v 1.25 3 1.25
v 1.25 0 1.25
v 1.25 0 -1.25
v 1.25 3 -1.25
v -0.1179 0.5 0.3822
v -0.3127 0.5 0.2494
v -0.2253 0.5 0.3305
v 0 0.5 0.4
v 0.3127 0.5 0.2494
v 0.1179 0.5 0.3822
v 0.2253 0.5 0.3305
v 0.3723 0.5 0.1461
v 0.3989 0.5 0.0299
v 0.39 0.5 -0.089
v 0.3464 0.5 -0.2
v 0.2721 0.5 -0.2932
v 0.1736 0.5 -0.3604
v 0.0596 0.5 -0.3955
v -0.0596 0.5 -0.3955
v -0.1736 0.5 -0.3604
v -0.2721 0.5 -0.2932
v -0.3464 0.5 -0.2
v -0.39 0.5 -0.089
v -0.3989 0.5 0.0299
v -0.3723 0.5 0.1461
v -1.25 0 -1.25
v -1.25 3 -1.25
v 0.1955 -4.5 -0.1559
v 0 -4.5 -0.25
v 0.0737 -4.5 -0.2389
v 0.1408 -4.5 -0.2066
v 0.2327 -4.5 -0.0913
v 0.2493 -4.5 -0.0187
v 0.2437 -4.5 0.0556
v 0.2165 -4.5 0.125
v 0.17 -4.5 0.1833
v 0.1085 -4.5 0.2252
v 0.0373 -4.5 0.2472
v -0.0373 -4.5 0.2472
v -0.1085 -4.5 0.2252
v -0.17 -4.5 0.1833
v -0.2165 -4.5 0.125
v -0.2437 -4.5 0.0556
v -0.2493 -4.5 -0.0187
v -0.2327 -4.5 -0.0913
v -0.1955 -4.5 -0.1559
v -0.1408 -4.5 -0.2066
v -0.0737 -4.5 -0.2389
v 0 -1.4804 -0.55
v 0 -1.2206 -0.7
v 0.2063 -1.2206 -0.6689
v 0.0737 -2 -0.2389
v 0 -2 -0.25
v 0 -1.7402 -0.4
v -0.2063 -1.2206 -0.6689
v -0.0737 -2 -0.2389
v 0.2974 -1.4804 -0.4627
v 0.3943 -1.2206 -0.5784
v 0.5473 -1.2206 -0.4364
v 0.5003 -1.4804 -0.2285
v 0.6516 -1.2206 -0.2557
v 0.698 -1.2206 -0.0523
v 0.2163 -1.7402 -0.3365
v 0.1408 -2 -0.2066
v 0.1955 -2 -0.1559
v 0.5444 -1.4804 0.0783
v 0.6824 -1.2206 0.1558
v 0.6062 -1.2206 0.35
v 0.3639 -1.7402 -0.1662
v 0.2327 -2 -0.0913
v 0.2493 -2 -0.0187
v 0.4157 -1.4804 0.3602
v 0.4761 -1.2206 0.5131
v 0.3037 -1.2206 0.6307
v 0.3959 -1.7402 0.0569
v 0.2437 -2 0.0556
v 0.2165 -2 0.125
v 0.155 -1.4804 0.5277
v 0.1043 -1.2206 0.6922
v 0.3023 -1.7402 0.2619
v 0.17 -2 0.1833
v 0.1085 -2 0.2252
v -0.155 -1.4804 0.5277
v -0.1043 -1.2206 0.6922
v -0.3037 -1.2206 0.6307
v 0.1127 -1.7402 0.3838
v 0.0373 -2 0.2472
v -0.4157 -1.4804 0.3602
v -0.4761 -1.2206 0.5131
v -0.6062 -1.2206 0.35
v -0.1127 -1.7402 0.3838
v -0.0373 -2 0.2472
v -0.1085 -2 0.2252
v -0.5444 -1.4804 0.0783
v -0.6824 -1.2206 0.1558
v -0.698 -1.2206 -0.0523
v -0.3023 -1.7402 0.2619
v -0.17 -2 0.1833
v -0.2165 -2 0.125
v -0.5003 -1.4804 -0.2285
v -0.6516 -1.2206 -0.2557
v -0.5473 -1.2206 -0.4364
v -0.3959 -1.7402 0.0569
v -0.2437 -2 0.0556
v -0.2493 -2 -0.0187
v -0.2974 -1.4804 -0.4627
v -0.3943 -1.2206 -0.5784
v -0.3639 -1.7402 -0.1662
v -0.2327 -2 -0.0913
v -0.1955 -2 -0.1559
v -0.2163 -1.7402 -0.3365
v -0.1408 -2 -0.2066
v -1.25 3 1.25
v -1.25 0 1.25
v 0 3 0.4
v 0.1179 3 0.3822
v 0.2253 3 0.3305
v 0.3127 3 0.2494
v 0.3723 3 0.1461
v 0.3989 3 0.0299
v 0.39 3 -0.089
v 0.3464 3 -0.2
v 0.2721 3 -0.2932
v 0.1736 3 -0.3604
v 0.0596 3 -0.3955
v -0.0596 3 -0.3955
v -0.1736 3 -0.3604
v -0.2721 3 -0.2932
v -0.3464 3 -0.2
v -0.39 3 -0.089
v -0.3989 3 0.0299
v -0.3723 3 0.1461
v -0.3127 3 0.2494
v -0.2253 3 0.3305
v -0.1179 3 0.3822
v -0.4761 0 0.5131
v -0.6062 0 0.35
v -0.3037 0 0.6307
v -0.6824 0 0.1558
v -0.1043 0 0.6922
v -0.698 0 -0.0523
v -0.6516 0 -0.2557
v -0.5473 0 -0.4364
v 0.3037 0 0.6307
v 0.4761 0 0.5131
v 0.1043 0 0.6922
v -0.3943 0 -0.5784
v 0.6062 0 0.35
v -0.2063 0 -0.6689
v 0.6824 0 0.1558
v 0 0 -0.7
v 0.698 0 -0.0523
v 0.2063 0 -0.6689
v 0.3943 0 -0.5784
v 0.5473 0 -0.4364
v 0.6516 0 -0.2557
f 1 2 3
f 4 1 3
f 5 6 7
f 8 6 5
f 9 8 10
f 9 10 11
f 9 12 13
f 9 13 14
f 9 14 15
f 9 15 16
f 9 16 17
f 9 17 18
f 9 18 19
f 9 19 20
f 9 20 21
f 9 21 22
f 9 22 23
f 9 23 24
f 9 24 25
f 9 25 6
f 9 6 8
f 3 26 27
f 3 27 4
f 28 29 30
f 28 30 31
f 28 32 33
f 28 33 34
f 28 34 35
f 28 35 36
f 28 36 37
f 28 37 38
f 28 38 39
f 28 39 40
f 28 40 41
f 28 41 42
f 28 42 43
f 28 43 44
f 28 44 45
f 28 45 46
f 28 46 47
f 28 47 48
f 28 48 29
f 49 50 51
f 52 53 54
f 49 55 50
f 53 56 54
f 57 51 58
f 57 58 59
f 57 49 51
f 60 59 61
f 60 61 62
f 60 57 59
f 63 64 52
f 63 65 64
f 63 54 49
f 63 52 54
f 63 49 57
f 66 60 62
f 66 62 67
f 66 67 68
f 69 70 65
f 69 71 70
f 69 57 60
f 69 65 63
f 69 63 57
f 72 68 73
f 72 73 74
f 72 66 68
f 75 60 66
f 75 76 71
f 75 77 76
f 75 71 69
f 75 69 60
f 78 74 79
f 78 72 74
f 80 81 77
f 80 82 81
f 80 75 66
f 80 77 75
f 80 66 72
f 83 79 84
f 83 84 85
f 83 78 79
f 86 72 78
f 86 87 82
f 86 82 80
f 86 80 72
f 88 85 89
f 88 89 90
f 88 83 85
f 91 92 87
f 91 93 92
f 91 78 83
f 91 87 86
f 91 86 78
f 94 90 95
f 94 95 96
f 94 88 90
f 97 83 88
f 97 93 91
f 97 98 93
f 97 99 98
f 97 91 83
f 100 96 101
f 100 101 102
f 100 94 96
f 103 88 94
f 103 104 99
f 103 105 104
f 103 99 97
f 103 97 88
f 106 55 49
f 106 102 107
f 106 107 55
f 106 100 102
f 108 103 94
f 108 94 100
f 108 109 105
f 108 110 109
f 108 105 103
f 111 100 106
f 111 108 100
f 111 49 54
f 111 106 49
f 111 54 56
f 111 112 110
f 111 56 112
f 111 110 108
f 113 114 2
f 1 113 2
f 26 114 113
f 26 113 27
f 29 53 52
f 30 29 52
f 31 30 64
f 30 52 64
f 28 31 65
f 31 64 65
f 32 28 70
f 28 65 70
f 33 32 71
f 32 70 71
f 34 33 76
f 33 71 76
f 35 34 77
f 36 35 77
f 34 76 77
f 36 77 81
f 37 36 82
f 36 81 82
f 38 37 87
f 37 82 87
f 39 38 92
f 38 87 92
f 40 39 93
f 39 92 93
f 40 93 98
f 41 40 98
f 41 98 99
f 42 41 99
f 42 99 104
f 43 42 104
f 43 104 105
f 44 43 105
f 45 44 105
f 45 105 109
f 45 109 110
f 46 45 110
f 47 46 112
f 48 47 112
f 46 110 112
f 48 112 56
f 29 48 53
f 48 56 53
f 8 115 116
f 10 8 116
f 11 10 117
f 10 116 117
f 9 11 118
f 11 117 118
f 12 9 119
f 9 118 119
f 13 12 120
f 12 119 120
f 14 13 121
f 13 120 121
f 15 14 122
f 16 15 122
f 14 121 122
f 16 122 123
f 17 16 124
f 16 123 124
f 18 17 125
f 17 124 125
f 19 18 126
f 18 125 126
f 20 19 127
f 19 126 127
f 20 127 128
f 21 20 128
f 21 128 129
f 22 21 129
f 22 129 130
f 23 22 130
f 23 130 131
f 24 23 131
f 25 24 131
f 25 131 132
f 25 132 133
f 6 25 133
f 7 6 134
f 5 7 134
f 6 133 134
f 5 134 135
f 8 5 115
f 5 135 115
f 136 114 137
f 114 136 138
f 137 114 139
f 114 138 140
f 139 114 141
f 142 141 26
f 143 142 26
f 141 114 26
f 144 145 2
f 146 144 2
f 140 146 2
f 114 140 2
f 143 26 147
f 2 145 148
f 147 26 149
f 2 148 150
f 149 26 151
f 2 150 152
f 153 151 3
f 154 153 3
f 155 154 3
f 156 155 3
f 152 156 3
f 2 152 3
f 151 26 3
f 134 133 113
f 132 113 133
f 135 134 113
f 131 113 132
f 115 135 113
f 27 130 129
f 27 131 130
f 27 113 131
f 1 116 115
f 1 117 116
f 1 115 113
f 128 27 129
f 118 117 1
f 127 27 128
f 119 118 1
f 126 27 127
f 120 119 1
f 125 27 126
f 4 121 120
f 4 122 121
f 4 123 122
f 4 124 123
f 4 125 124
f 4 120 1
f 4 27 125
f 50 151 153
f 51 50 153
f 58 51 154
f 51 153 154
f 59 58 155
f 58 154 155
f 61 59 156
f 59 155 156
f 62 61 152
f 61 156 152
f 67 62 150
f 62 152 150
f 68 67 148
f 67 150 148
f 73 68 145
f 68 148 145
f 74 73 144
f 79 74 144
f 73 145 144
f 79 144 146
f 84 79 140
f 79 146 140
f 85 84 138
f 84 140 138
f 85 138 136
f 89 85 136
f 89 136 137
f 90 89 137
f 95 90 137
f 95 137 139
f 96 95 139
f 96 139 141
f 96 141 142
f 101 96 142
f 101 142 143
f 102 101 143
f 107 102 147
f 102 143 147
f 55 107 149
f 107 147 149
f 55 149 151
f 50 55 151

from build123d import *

# Parameters (mm, degrees)
SKETCH_1_W          = 2.5
SKETCH_1_H          = 2.5
EXTRUDE_1_DEPTH     = 3
SKETCH_2_R          = 0.7
EXTRUDE_2_DEPTH     = 2
CHAMFER_1_SIZE      = 0.779422863
CHAMFER_1_SIZE2     = 0.45
SKETCH_3_R          = 0.25
EXTRUDE_3_DEPTH     = 2.5
SKETCH_4_R          = 0.4
CUT_EXTRUDE_1_DEPTH = 2.5


with BuildPart() as part:
    # Эскиз1 → Бобышка-Вытянуть1 (new body)
    with BuildSketch(Plane(origin=(0, 0, 0), x_dir=(1, 0, 0), z_dir=(0, 1, 0))):
        Rectangle(SKETCH_1_W, SKETCH_1_H)
    extrude(amount=EXTRUDE_1_DEPTH)

    # Эскиз2 → Бобышка-Вытянуть2 (add)
    with BuildSketch(Plane.XZ):
        with Locations(Location((0, 0, 0), (0, 0, 270))):
            Circle(SKETCH_2_R)
    extrude(amount=EXTRUDE_2_DEPTH)

    # Фаска1
    chamfer_1_edges = [part.edges().sort_by_distance(p)[0] for p in [
        (0, -2, 0.7),
    ]]
    chamfer_1_side = [part.faces().sort_by_distance(p)[0] for p in [
        (0, -1, 0.7),
    ]]
    chamfer(chamfer_1_edges, length=CHAMFER_1_SIZE, length2=CHAMFER_1_SIZE2, reference=chamfer_1_side[0])

    # Эскиз3 → Бобышка-Вытянуть3 (add)
    with BuildSketch(Plane.XZ.offset(2)):
        with Locations(Location((0, 0, 0), (0, 0, 270))):
            Circle(SKETCH_3_R)
    extrude(amount=EXTRUDE_3_DEPTH)

    # Эскиз4 → Вырез-Вытянуть1 (cut)
    with BuildSketch(Plane(origin=(0, 3, 0), x_dir=(1, 0, 0), z_dir=(0, 1, 0))):
        with Locations(Location((0, 0, 0), (0, 0, 270))):
            Circle(SKETCH_4_R)
    extrude(amount=-CUT_EXTRUDE_1_DEPTH, mode=Mode.SUBTRACT)


solid = part.part
